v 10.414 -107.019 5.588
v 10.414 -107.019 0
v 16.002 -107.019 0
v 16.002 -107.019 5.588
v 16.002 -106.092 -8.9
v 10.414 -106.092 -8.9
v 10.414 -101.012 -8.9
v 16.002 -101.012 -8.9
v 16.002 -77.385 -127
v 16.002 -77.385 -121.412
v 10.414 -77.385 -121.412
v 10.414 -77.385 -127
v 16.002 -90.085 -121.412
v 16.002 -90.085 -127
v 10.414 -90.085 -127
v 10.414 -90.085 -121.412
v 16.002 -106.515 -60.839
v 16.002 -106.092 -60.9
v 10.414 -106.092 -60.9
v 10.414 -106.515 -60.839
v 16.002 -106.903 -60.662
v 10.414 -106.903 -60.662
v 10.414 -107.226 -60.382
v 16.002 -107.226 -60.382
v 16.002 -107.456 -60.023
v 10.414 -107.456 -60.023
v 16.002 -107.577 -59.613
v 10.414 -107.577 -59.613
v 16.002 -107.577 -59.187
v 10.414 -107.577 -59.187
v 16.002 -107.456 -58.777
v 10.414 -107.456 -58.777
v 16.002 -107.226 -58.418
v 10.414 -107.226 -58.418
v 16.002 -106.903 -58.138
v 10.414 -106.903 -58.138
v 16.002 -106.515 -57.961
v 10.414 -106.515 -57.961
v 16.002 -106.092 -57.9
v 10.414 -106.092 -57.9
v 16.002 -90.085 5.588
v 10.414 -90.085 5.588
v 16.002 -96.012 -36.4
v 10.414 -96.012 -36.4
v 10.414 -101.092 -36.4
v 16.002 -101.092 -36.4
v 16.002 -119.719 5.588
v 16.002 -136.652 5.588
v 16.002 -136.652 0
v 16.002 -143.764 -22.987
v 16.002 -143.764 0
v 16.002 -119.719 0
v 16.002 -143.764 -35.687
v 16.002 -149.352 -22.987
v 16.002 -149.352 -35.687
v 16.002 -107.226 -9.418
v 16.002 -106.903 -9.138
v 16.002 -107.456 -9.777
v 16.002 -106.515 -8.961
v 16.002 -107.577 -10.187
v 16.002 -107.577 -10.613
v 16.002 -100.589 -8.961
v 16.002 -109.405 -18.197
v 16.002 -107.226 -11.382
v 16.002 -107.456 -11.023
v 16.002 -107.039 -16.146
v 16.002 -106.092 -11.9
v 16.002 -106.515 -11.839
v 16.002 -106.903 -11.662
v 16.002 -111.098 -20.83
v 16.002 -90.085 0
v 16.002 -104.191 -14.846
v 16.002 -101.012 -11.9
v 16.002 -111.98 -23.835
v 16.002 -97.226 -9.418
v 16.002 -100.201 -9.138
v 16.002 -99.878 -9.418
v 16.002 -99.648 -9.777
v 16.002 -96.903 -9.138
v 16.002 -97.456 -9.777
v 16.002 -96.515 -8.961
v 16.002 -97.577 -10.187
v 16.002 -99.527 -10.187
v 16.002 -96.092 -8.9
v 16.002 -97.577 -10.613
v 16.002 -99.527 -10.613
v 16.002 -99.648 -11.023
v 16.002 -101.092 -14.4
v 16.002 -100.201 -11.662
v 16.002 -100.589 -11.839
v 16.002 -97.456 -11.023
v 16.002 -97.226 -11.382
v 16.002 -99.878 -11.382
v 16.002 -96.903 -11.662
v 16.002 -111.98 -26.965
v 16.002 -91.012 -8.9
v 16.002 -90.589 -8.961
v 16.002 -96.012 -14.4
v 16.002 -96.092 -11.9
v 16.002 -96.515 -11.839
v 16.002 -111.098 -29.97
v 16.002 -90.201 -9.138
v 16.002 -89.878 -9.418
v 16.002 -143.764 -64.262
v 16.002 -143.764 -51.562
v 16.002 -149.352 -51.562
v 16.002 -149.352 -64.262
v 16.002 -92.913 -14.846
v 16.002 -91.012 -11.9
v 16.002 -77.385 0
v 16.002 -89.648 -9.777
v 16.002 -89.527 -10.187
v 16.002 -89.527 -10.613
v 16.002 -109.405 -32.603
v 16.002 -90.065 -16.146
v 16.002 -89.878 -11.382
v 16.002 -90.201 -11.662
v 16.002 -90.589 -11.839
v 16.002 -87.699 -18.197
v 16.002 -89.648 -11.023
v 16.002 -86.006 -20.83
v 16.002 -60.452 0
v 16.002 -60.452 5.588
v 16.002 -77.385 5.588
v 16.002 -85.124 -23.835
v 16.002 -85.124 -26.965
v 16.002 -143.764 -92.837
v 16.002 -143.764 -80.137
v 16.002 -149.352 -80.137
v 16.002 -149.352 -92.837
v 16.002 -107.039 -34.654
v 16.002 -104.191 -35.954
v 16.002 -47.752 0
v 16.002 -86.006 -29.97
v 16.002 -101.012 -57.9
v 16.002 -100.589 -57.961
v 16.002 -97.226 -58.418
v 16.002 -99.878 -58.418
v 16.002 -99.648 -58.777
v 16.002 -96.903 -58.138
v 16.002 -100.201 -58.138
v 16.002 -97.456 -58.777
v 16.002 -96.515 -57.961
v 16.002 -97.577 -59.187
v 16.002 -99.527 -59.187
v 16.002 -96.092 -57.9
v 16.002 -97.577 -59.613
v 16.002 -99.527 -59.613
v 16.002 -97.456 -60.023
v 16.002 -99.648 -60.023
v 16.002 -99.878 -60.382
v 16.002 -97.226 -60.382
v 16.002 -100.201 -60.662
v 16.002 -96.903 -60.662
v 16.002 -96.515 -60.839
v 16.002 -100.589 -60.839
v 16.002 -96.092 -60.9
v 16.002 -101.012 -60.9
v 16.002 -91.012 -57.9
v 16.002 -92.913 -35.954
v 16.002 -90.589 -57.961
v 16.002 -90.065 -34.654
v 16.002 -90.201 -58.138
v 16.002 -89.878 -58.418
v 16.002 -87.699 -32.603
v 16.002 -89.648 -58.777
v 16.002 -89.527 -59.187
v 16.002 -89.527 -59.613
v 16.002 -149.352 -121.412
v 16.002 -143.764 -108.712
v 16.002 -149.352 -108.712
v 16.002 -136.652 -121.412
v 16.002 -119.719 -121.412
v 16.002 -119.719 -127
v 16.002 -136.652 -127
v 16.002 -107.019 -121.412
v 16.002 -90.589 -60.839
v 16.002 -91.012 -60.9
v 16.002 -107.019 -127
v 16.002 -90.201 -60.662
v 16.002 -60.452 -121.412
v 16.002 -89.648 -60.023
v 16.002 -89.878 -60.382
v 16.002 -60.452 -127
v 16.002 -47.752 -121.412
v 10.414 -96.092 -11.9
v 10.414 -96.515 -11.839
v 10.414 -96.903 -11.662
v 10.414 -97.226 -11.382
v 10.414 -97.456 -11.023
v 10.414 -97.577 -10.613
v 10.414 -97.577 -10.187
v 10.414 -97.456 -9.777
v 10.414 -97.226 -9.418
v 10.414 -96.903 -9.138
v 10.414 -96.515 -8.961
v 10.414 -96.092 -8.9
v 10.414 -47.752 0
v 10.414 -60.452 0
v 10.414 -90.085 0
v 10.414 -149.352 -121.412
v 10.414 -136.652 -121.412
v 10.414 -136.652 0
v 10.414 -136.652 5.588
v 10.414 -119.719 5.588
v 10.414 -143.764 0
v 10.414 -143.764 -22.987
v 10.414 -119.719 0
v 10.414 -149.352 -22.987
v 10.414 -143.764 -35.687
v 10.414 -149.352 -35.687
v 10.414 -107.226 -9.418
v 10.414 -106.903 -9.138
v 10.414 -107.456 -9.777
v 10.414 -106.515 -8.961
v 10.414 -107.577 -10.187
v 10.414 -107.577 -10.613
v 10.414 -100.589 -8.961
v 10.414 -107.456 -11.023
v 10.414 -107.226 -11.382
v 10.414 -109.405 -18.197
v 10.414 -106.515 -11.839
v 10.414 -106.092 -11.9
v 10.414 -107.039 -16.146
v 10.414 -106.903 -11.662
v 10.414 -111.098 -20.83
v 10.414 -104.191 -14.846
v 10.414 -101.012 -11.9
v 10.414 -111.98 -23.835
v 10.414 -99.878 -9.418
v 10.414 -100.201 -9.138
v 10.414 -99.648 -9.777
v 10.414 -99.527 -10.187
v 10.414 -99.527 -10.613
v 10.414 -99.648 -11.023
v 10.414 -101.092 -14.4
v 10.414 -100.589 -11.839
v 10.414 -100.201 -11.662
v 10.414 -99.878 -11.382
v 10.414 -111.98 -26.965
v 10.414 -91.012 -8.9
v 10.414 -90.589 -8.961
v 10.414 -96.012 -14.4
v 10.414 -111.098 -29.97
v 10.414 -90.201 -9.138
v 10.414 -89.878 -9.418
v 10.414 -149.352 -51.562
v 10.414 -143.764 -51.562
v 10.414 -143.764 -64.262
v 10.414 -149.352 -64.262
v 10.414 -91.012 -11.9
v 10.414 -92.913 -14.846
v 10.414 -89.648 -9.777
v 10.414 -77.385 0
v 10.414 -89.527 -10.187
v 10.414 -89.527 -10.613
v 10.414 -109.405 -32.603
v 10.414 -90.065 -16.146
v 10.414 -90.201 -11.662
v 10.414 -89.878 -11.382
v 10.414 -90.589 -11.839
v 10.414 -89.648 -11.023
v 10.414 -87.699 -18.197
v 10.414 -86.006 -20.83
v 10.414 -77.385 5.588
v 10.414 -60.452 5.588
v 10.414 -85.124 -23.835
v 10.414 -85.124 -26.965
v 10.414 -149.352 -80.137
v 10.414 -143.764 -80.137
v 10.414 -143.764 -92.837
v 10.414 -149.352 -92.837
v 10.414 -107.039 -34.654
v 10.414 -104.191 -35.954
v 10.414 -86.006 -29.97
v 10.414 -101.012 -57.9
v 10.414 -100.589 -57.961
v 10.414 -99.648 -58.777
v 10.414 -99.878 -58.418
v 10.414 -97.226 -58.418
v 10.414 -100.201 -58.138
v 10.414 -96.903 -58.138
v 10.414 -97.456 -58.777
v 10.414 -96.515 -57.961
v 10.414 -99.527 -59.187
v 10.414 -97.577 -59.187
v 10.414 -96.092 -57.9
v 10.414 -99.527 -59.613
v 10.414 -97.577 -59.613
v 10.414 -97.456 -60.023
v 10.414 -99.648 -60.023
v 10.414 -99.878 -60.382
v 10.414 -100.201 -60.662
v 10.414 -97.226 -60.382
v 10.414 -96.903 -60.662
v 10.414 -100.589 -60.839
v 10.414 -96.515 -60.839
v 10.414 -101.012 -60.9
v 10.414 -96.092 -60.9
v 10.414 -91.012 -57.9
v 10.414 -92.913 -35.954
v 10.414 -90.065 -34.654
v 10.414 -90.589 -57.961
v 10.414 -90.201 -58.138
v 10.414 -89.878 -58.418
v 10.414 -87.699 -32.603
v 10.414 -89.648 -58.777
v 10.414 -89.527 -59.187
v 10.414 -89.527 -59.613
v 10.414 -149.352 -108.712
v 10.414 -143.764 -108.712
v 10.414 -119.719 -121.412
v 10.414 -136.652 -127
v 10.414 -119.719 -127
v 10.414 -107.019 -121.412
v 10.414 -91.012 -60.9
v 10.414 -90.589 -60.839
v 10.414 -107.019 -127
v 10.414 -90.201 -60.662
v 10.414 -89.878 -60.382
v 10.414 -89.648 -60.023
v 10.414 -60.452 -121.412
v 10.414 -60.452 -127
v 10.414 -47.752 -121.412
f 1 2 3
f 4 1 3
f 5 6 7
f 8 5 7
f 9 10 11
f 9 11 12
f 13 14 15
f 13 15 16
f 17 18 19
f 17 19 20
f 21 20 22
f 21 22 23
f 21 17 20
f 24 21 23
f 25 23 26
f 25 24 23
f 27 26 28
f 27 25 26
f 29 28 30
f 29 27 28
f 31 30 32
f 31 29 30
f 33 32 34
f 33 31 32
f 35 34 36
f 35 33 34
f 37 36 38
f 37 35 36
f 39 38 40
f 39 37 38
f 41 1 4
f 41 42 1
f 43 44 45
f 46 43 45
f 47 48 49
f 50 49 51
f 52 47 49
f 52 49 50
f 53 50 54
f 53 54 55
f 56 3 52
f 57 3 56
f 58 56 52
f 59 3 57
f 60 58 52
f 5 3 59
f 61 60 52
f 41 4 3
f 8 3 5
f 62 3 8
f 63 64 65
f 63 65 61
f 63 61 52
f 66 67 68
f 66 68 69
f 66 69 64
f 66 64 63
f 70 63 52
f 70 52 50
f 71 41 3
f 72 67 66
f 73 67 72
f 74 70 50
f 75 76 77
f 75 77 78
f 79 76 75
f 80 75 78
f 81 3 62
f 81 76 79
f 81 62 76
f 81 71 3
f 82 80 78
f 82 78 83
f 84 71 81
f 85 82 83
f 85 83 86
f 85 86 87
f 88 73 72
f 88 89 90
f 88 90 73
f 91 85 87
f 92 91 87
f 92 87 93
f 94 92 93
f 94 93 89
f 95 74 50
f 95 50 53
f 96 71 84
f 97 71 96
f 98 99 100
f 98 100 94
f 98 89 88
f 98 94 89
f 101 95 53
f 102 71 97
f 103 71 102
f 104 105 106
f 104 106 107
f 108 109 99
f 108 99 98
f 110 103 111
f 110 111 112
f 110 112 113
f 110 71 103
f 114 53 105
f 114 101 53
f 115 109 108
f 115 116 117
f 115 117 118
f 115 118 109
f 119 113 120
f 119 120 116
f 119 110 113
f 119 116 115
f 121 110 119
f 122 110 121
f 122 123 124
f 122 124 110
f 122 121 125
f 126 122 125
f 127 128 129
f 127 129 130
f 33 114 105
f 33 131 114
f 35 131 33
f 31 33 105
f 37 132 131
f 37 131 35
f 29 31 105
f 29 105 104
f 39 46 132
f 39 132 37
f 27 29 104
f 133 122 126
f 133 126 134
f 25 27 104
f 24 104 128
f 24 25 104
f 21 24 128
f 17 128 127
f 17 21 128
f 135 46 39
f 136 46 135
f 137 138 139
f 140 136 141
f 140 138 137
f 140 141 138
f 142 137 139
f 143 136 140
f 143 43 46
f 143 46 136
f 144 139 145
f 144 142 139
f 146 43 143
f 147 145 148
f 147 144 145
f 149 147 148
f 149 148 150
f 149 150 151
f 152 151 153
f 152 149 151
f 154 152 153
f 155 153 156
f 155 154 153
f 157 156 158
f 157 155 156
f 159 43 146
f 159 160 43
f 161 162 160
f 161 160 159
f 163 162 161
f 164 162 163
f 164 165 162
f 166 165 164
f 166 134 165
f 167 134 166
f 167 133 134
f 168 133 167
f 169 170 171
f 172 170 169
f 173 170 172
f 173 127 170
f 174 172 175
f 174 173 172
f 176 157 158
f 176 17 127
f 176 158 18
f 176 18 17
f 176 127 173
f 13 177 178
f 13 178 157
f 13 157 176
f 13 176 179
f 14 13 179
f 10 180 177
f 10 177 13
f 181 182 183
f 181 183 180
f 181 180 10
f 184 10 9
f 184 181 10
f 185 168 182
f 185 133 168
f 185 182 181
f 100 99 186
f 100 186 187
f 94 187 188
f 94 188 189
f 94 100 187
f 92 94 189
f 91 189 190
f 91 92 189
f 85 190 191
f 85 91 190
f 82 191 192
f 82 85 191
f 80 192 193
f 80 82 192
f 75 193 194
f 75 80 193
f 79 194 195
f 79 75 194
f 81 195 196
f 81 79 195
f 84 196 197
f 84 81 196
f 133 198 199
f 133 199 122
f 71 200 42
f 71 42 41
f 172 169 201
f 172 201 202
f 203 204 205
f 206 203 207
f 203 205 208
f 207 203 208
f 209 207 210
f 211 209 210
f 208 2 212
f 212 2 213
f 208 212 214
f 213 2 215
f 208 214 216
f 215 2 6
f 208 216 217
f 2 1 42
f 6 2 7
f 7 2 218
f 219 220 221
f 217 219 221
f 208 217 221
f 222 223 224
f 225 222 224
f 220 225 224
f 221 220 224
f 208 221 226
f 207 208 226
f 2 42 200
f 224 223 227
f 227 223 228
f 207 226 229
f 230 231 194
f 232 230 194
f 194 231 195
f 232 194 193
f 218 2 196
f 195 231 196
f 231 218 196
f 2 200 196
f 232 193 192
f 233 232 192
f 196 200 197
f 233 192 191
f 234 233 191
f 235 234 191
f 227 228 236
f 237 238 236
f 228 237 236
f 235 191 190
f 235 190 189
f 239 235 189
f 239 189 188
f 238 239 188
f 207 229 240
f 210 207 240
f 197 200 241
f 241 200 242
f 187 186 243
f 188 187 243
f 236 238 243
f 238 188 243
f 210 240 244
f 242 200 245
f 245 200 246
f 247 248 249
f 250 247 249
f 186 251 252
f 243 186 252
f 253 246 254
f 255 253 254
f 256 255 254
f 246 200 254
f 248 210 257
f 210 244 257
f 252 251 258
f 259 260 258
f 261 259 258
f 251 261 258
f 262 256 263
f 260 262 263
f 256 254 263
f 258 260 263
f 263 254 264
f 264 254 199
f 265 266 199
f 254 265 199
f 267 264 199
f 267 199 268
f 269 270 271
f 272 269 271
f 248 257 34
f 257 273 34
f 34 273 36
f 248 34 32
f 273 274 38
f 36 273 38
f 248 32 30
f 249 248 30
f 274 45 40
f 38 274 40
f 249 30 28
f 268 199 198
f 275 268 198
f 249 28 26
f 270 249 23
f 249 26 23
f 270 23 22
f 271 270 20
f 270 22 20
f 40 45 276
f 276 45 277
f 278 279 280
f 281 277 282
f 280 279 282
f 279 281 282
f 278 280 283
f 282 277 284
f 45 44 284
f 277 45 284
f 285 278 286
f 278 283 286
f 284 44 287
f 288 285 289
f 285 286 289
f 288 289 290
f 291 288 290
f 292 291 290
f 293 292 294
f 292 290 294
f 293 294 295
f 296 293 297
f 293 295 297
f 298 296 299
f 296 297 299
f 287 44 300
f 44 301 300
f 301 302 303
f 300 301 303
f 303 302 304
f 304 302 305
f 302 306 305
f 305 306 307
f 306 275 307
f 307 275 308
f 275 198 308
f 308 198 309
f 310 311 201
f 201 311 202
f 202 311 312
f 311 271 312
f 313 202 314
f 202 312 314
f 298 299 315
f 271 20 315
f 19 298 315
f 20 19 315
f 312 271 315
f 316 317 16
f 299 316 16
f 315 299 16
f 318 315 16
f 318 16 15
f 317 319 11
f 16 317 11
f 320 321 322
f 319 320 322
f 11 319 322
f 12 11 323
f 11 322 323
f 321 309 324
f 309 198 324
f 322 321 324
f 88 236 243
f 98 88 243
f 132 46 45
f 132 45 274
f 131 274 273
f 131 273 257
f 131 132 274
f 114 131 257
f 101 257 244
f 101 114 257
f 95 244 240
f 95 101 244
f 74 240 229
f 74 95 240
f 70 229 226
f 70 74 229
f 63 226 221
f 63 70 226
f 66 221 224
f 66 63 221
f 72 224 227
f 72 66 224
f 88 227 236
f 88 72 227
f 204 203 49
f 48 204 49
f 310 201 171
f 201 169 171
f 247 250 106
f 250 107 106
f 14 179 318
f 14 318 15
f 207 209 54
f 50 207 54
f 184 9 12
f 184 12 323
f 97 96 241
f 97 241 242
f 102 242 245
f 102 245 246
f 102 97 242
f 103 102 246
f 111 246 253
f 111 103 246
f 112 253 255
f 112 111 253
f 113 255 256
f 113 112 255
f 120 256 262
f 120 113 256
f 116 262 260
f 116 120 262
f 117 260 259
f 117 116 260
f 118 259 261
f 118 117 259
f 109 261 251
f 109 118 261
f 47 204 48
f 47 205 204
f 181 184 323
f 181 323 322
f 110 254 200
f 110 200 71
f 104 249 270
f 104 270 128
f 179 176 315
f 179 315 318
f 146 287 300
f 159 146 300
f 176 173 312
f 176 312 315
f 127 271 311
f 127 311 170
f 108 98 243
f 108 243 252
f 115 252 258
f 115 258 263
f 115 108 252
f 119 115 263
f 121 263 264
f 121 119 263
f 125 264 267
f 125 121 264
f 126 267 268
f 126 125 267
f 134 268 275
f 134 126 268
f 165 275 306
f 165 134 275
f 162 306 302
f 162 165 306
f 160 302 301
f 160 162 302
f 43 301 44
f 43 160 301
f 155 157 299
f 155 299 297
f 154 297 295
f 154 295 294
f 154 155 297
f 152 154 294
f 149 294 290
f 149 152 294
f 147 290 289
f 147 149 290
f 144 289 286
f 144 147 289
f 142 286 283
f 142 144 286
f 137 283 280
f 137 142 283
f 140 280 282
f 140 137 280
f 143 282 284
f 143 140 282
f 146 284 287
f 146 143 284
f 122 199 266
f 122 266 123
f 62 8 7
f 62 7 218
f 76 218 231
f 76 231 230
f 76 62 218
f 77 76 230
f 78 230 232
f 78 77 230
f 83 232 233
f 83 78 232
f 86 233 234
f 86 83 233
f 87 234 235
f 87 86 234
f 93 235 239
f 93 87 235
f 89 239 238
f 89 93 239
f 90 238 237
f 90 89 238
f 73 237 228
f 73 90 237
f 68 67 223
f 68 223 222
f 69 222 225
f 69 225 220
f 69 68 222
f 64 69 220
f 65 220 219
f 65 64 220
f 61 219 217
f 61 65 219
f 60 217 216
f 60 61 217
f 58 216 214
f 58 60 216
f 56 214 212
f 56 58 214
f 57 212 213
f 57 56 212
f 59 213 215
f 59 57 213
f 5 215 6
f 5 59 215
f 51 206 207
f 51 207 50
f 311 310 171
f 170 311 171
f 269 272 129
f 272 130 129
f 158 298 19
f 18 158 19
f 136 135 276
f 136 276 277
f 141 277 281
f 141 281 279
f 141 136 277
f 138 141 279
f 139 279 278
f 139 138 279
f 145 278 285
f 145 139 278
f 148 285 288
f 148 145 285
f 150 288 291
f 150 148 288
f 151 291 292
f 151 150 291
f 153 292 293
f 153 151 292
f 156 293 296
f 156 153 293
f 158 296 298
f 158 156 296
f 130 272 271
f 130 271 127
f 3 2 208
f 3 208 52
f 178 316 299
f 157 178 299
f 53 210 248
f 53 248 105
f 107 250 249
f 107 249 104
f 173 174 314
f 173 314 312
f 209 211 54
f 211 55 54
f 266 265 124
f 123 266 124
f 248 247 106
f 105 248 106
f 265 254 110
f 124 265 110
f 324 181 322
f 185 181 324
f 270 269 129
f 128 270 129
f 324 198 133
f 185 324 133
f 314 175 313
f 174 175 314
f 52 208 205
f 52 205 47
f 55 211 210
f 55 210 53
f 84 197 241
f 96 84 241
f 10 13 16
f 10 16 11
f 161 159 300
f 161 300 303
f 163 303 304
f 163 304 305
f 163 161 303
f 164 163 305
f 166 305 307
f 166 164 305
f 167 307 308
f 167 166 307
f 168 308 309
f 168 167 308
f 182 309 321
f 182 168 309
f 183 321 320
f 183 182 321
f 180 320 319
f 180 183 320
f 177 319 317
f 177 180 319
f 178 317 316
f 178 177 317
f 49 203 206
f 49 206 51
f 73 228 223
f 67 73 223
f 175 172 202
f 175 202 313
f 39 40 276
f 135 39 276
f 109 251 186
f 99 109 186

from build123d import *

# Parameters (mm, degrees)
SKETCH1_W               = 44.958
SKETCH1_H               = 304.8
BOSS_EXTRUDE1_DEPTH     = 5.588
BOSS_EXTRUDE2_DEPTH     = 5.588
SKETCH3_W               = 121.412
SKETCH3_H               = 5.588
BOSS_EXTRUDE3_DEPTH     = 39.37
SKETCH8_W               = 5.588
SKETCH8_H               = 213.451350416
CUT_EXTRUDE4_DEPTH      = 1
CUT_EXTRUDE4_DEPTH_BACK = 133.588
SKETCH6_W               = 5.588
SKETCH6_H               = 12.7
CUT_EXTRUDE5_DEPTH      = 5.588
SKETCH4_3_W             = 6.35
SKETCH4_3_H             = 15.875
SKETCH4_3_H_2           = 5.588
SKETCH4_3_H_3           = 7.112
CUT_EXTRUDE6_DEPTH      = 5.588


with BuildPart() as part:
    # Sketch1 → Boss-Extrude1 (new body)
    with BuildSketch(Plane.XY):
        with Locations((-6.477, 3.048)):
            Rectangle(SKETCH1_W, SKETCH1_H)
        with BuildLine():
            Line((-3.302, 133.858), (-3.302, -143.002))
            Line((-3.302, -143.002), (3.302, -143.002))
            Line((3.302, -143.002), (3.302, 143.002))
            Line((3.302, 143.002), (-16.256, 143.002))
            Line((-16.256, 143.002), (-16.256, 136.398))
            Line((-16.256, 136.398), (-5.842, 136.398))
            ThreePointArc((-5.842, 136.398), (-4.045948776, 135.654051224), (-3.302, 133.858))
        make_face(mode=Mode.SUBTRACT)
    extrude(amount=BOSS_EXTRUDE1_DEPTH)

    # Sketch2 → Boss-Extrude2 (add)
    with BuildSketch(Plane(origin=(16.002, 0, 0), x_dir=(0, 0, -1), z_dir=(1, 0, 0))):
        Polygon((121.412, -47.752), (-5.588, -47.752), (-5.588, -149.352), (121.412, -149.352), (121.412, -136.652), (127, -136.652), (127, -119.718666667), (121.412, -119.718666667), (121.412, -107.018666667), (127, -107.018666667), (127, -90.085333333), (121.412, -90.085333333), (121.412, -77.385333333), (127, -77.385333333), (127, -60.452), (121.412, -60.452), align=None)
        with BuildLine():
            ThreePointArc((11.9, -106.092), (10.4, -107.592), (8.9, -106.092))
            Line((8.9, -106.092), (8.9, -101.012))
            ThreePointArc((8.9, -101.012), (10.4, -99.512), (11.9, -101.012))
            Line((11.9, -101.012), (11.9, -106.092))
        make_face(mode=Mode.SUBTRACT)
        with BuildLine():
            ThreePointArc((60.9, -106.092), (59.4, -107.592), (57.9, -106.092))
            Line((57.9, -106.092), (57.9, -101.012))
            ThreePointArc((57.9, -101.012), (59.4, -99.512), (60.9, -101.012))
            Line((60.9, -101.012), (60.9, -106.092))
        make_face(mode=Mode.SUBTRACT)
        with BuildLine():
            Line((8.9, -96.092), (8.9, -91.012))
            ThreePointArc((8.9, -91.012), (10.4, -89.512), (11.9, -91.012))
            Line((11.9, -91.012), (11.9, -96.092))
            ThreePointArc((11.9, -96.092), (10.4, -97.592), (8.9, -96.092))
        make_face(mode=Mode.SUBTRACT)
        with BuildLine():
            ThreePointArc((36.4, -101.092), (25.4, -112.092), (14.4, -101.092))
            Line((14.4, -101.092), (14.4, -96.012))
            ThreePointArc((14.4, -96.012), (25.4, -85.012), (36.4, -96.012))
            Line((36.4, -96.012), (36.4, -101.092))
        make_face(mode=Mode.SUBTRACT)
        with BuildLine():
            ThreePointArc((57.9, -91.012), (59.4, -89.512), (60.9, -91.012))
            Line((60.9, -91.012), (60.9, -96.092))
            ThreePointArc((60.9, -96.092), (59.4, -97.592), (57.9, -96.092))
            Line((57.9, -96.092), (57.9, -91.012))
        make_face(mode=Mode.SUBTRACT)
    extrude(amount=-BOSS_EXTRUDE2_DEPTH)

    # Sketch3 → Boss-Extrude3 (add)
    with BuildSketch(Plane.ZY.offset(-10.414)):
        with Locations((-60.706, -146.558)):
            Rectangle(SKETCH3_W, SKETCH3_H)
    extrude(amount=BOSS_EXTRUDE3_DEPTH)

    # Sketch8 → Cut-Extrude4 (cut, two sides)
    with BuildSketch(Plane.XY.offset(5.588)) as cut_extrude4_sk:
        Polygon((-28.956, -149.352), (10.414, -149.352), (10.414, -47.752), (10.414, 155.448), (-28.956, 155.448), align=None)
        with BuildLine():
            Line((-16.256, 136.398), (-16.256, 143.002))
            Line((-16.256, 143.002), (3.302, 143.002))
            Line((3.302, 143.002), (3.302, -143.002))
            Line((3.302, -143.002), (-3.302, -143.002))
            Line((-3.302, -143.002), (-3.302, 133.858))
            ThreePointArc((-3.302, 133.858), (-4.045948776, 135.654051224), (-5.842, 136.398))
            Line((-5.842, 136.398), (-16.256, 136.398))
        make_face(mode=Mode.SUBTRACT)
        Polygon((-54.223542679, -149.352), (-28.956, -149.352), (-28.956, 155.448), (10.414, 155.448), (10.414, 165.699350416), (-54.223542679, 165.699350416), align=None)
        with Locations((13.208, 58.973675208)):
            Rectangle(SKETCH8_W, SKETCH8_H)
    extrude(amount=CUT_EXTRUDE4_DEPTH, mode=Mode.SUBTRACT)
    extrude(cut_extrude4_sk.sketch, amount=-CUT_EXTRUDE4_DEPTH_BACK, mode=Mode.SUBTRACT)

    # Sketch6 → Cut-Extrude5 (cut)
    with BuildSketch(Plane.XY.offset(5.588)):
        with Locations((13.208, -54.102)):
            Rectangle(SKETCH6_W, SKETCH6_H)
        with Locations((13.208, -83.735333333)):
            Rectangle(SKETCH6_W, SKETCH6_H)
        with Locations((13.208, -113.368666667)):
            Rectangle(SKETCH6_W, SKETCH6_H)
        with Locations((13.208, -143.002)):
            Rectangle(SKETCH6_W, SKETCH6_H)
    extrude(amount=-CUT_EXTRUDE5_DEPTH, mode=Mode.SUBTRACT)

    # Sketch4<3> → Cut-Extrude6 (cut)
    with BuildSketch(Plane.XZ.offset(149.352)):
        with Locations((12.827, -100.7745)):
            Rectangle(SKETCH4_3_W, SKETCH4_3_H)
        with Locations((12.827, -72.1995)):
            Rectangle(SKETCH4_3_W, SKETCH4_3_H)
        with Locations((12.827, -43.6245)):
            Rectangle(SKETCH4_3_W, SKETCH4_3_H)
        with Locations((12.827, -15.0495)):
            Rectangle(SKETCH4_3_W, SKETCH4_3_H)
        with Locations((12.827, 2.794)):
            Rectangle(SKETCH4_3_W, SKETCH4_3_H_2)
        with Locations((12.827, -3.556)):
            Rectangle(SKETCH4_3_W, SKETCH4_3_H_3)
    extrude(amount=-CUT_EXTRUDE6_DEPTH, mode=Mode.SUBTRACT)


solid = part.part
